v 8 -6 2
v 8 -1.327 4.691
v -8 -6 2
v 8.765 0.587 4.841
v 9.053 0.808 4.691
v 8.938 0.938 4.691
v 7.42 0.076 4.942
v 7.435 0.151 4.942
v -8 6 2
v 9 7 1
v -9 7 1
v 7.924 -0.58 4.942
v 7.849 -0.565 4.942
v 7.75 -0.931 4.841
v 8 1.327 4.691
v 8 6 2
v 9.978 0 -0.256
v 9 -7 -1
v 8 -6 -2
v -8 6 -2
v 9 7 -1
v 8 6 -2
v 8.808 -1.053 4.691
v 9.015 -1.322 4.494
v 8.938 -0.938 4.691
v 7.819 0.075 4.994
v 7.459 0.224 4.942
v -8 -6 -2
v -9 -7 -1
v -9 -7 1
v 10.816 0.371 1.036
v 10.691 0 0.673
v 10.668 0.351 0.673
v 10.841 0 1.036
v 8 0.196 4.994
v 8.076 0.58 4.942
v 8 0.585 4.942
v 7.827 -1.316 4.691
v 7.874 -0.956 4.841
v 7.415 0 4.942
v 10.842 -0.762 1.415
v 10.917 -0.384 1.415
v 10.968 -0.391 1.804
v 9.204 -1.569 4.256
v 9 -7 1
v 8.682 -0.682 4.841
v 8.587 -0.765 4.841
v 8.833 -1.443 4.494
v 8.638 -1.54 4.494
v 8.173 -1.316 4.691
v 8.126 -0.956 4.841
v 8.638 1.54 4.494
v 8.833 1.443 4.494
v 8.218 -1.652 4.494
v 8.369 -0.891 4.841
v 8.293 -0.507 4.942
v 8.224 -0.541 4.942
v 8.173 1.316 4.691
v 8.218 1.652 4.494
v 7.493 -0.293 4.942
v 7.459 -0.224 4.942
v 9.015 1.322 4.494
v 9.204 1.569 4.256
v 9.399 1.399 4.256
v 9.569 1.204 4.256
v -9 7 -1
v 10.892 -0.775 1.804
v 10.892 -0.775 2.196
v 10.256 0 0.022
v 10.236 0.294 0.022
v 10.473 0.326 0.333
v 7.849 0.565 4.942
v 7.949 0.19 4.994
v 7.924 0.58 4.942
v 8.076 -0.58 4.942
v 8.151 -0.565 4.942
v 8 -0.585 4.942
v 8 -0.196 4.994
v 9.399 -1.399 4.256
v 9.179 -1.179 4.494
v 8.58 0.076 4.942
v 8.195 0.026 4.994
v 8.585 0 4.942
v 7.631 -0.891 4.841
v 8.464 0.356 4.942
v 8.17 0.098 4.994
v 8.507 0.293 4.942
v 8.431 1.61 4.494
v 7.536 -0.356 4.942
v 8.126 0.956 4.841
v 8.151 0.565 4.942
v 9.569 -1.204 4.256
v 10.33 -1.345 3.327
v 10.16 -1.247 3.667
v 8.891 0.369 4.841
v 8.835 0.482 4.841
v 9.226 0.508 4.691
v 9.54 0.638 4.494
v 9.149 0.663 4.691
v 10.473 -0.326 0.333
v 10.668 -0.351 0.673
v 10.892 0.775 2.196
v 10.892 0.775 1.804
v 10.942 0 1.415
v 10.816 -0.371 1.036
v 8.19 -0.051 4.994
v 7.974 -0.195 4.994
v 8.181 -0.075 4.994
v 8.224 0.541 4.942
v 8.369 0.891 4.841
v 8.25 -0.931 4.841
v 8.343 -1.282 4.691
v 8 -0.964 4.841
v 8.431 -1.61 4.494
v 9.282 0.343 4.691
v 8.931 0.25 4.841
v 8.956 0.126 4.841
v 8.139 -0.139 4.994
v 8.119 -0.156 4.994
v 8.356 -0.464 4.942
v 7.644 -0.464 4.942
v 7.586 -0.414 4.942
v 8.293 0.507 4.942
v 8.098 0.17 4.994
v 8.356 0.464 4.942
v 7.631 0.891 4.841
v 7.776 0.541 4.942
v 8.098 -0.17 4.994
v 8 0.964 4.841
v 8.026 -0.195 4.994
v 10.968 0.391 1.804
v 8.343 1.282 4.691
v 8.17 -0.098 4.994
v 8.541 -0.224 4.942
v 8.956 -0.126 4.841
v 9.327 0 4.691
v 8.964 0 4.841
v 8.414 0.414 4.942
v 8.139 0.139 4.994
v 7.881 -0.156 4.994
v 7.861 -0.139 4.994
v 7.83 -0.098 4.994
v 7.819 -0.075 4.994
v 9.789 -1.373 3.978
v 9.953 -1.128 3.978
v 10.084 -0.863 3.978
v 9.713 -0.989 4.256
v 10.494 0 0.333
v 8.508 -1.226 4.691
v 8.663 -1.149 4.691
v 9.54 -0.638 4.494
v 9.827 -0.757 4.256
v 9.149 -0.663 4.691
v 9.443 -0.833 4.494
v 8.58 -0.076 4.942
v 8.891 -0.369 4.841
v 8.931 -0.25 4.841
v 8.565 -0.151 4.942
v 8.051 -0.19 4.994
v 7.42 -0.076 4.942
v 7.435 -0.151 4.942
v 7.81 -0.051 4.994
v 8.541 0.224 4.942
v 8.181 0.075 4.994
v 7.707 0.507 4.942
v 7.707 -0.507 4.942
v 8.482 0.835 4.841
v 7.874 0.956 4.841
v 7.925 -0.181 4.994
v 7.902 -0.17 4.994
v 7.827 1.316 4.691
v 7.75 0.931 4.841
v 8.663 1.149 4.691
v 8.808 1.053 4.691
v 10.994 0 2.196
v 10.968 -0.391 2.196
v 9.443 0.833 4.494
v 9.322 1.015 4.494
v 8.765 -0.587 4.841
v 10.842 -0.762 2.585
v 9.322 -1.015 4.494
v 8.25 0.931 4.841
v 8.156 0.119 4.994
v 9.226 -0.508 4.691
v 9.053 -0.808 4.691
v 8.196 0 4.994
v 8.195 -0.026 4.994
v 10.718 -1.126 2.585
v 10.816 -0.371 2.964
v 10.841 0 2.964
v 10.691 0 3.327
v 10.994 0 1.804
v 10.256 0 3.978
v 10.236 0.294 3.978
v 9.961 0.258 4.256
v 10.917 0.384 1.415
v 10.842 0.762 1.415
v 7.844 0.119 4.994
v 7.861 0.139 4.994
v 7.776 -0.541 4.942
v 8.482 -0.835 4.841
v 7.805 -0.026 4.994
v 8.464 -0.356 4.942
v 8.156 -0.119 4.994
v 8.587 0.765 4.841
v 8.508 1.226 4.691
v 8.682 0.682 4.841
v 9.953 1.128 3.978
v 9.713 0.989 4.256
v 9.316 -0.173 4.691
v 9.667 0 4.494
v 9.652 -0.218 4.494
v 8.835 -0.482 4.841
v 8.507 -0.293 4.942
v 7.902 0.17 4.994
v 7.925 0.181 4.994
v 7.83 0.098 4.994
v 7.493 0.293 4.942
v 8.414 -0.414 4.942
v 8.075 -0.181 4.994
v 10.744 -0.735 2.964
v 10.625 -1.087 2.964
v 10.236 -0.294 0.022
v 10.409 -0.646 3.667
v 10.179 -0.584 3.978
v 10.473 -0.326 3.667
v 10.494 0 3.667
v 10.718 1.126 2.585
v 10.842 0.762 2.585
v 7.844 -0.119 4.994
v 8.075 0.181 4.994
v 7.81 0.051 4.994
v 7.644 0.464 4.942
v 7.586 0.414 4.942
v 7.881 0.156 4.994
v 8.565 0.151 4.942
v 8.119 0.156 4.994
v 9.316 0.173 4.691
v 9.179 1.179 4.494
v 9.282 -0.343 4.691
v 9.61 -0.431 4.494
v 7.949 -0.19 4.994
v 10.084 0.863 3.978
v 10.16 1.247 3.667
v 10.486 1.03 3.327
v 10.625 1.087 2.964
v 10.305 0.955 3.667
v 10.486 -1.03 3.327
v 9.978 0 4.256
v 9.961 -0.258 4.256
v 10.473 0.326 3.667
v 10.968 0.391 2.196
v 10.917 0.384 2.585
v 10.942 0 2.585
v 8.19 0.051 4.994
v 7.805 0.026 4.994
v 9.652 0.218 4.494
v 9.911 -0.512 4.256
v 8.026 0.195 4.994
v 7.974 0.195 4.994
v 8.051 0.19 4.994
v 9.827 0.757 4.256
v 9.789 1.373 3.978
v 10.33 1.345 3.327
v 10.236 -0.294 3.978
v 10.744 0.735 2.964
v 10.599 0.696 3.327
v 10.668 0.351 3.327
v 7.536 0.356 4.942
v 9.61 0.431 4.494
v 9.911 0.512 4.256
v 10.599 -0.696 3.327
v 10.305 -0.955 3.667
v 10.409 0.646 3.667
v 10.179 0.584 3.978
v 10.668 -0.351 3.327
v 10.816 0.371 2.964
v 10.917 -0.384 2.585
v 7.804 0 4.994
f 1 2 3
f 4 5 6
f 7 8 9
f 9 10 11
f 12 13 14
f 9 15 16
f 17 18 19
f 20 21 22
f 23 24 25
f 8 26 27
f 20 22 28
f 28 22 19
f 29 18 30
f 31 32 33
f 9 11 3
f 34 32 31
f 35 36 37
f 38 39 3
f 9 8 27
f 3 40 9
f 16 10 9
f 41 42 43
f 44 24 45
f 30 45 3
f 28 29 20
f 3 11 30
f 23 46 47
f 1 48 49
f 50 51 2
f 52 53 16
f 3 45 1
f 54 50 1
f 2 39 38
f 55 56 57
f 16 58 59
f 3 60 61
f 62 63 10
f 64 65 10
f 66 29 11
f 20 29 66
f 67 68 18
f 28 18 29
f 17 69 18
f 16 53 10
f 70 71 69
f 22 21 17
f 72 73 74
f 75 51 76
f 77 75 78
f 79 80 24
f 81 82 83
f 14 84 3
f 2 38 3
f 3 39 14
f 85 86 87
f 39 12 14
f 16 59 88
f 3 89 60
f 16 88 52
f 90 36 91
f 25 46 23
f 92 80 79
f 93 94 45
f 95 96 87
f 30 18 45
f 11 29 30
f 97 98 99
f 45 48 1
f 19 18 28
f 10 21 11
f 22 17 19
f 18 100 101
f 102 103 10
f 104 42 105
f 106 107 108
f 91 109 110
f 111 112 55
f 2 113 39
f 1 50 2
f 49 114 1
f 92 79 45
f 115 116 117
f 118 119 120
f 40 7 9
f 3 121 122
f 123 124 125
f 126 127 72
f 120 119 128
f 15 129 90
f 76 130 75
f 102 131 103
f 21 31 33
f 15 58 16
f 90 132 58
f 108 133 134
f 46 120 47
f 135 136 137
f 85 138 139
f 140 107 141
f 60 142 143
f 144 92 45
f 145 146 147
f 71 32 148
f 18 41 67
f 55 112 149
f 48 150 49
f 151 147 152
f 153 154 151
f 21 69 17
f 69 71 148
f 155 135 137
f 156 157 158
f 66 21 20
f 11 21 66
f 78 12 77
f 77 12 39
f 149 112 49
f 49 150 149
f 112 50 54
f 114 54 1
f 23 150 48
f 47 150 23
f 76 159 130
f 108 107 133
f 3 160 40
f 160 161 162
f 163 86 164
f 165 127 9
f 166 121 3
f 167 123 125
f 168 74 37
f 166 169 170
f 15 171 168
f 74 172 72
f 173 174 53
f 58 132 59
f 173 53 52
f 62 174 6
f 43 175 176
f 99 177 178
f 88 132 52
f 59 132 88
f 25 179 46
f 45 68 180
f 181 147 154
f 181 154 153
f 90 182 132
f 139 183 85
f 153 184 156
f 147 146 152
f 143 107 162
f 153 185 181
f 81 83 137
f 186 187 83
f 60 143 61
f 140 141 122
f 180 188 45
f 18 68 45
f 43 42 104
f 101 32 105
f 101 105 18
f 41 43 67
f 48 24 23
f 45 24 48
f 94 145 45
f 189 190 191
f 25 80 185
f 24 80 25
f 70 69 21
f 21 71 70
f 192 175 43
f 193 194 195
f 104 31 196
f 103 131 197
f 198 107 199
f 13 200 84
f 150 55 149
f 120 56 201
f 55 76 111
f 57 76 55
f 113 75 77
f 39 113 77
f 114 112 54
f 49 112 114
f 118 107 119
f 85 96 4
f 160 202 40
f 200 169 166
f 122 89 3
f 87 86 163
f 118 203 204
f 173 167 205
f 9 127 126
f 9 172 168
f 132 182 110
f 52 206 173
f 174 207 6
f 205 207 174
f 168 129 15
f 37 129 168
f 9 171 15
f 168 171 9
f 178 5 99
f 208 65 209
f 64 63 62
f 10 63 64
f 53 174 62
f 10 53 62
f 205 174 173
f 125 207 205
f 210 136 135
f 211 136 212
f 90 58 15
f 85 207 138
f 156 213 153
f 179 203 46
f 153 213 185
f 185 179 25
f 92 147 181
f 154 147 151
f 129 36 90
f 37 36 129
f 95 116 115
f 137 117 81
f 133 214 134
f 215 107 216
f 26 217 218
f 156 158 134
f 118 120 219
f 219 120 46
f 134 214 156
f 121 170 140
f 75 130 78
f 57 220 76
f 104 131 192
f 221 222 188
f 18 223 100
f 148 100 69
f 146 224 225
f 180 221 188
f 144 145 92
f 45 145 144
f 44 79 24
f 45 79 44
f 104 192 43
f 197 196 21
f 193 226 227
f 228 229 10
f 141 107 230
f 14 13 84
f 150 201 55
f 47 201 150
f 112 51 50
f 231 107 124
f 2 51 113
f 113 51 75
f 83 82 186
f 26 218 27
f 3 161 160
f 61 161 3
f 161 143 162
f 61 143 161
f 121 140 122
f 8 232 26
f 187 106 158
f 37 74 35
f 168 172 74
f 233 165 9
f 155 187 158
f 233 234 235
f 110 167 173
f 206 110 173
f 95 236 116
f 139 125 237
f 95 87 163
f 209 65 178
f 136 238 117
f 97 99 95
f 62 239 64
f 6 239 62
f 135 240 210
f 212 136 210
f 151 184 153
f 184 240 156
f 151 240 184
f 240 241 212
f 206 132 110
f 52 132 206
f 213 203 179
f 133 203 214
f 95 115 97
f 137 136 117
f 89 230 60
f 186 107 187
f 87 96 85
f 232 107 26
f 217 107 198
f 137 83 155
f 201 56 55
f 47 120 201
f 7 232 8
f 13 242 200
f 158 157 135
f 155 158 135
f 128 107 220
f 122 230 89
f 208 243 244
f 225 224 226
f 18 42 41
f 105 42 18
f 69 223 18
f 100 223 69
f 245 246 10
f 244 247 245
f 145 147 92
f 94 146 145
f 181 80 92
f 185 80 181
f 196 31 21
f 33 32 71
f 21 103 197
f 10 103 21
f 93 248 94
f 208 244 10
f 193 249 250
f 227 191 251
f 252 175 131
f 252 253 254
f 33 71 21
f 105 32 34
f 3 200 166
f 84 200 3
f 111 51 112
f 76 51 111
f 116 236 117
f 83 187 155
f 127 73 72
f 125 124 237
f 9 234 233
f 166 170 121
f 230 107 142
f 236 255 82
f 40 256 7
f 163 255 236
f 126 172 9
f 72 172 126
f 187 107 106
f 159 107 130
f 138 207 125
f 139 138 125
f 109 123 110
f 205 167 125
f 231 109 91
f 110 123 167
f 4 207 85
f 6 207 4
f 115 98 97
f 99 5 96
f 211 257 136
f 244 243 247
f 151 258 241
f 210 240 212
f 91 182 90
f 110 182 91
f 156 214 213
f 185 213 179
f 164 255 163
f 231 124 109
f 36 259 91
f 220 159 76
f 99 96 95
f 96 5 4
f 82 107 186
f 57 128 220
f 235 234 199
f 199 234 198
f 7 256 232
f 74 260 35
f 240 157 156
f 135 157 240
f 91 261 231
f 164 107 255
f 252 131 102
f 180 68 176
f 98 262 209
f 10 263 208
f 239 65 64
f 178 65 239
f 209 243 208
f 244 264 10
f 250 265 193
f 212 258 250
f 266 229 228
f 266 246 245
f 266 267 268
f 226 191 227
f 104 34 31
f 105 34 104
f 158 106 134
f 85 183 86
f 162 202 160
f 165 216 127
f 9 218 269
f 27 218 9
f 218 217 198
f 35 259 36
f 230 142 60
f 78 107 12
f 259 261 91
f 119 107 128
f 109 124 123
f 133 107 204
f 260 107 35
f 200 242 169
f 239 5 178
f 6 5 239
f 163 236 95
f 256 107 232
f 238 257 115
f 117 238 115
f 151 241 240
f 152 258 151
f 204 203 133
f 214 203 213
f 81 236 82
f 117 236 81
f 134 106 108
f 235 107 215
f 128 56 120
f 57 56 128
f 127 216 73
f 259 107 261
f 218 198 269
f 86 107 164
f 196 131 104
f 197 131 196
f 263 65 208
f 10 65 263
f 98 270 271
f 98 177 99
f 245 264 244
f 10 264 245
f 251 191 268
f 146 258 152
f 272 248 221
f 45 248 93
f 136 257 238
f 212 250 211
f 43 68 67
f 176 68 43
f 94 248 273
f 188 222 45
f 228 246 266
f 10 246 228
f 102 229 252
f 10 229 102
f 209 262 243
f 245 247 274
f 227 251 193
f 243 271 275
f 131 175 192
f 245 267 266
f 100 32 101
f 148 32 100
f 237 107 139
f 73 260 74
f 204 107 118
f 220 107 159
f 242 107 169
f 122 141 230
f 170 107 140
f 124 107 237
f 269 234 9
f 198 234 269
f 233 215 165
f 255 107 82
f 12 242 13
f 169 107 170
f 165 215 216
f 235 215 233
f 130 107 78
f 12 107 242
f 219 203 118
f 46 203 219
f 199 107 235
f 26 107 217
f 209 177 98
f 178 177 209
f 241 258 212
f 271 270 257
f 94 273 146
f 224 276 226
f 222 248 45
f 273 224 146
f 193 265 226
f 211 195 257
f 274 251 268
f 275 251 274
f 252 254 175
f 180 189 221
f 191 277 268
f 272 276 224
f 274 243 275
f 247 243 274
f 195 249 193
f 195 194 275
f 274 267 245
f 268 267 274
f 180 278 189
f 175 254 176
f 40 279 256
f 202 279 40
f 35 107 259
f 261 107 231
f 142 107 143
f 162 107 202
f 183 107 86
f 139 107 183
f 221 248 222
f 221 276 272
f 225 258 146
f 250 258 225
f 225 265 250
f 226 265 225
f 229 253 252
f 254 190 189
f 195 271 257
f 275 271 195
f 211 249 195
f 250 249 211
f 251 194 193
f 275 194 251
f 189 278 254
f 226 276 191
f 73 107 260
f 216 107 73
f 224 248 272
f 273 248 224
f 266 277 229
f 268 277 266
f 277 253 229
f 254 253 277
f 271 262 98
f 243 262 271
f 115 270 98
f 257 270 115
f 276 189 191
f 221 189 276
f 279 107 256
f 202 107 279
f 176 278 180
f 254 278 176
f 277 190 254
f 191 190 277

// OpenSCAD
$fa = 2;
$fs = 0.4;

module vtx_module() {
  color("#1a1a22")
    hull() {
      cube([16, 12, 4], center = true);
      translate([0, 0, 0])
        cube([18, 14, 2], center = true);
      translate([8, 0, 2])
        sphere(d = 6);
    }
}

vtx_module();
